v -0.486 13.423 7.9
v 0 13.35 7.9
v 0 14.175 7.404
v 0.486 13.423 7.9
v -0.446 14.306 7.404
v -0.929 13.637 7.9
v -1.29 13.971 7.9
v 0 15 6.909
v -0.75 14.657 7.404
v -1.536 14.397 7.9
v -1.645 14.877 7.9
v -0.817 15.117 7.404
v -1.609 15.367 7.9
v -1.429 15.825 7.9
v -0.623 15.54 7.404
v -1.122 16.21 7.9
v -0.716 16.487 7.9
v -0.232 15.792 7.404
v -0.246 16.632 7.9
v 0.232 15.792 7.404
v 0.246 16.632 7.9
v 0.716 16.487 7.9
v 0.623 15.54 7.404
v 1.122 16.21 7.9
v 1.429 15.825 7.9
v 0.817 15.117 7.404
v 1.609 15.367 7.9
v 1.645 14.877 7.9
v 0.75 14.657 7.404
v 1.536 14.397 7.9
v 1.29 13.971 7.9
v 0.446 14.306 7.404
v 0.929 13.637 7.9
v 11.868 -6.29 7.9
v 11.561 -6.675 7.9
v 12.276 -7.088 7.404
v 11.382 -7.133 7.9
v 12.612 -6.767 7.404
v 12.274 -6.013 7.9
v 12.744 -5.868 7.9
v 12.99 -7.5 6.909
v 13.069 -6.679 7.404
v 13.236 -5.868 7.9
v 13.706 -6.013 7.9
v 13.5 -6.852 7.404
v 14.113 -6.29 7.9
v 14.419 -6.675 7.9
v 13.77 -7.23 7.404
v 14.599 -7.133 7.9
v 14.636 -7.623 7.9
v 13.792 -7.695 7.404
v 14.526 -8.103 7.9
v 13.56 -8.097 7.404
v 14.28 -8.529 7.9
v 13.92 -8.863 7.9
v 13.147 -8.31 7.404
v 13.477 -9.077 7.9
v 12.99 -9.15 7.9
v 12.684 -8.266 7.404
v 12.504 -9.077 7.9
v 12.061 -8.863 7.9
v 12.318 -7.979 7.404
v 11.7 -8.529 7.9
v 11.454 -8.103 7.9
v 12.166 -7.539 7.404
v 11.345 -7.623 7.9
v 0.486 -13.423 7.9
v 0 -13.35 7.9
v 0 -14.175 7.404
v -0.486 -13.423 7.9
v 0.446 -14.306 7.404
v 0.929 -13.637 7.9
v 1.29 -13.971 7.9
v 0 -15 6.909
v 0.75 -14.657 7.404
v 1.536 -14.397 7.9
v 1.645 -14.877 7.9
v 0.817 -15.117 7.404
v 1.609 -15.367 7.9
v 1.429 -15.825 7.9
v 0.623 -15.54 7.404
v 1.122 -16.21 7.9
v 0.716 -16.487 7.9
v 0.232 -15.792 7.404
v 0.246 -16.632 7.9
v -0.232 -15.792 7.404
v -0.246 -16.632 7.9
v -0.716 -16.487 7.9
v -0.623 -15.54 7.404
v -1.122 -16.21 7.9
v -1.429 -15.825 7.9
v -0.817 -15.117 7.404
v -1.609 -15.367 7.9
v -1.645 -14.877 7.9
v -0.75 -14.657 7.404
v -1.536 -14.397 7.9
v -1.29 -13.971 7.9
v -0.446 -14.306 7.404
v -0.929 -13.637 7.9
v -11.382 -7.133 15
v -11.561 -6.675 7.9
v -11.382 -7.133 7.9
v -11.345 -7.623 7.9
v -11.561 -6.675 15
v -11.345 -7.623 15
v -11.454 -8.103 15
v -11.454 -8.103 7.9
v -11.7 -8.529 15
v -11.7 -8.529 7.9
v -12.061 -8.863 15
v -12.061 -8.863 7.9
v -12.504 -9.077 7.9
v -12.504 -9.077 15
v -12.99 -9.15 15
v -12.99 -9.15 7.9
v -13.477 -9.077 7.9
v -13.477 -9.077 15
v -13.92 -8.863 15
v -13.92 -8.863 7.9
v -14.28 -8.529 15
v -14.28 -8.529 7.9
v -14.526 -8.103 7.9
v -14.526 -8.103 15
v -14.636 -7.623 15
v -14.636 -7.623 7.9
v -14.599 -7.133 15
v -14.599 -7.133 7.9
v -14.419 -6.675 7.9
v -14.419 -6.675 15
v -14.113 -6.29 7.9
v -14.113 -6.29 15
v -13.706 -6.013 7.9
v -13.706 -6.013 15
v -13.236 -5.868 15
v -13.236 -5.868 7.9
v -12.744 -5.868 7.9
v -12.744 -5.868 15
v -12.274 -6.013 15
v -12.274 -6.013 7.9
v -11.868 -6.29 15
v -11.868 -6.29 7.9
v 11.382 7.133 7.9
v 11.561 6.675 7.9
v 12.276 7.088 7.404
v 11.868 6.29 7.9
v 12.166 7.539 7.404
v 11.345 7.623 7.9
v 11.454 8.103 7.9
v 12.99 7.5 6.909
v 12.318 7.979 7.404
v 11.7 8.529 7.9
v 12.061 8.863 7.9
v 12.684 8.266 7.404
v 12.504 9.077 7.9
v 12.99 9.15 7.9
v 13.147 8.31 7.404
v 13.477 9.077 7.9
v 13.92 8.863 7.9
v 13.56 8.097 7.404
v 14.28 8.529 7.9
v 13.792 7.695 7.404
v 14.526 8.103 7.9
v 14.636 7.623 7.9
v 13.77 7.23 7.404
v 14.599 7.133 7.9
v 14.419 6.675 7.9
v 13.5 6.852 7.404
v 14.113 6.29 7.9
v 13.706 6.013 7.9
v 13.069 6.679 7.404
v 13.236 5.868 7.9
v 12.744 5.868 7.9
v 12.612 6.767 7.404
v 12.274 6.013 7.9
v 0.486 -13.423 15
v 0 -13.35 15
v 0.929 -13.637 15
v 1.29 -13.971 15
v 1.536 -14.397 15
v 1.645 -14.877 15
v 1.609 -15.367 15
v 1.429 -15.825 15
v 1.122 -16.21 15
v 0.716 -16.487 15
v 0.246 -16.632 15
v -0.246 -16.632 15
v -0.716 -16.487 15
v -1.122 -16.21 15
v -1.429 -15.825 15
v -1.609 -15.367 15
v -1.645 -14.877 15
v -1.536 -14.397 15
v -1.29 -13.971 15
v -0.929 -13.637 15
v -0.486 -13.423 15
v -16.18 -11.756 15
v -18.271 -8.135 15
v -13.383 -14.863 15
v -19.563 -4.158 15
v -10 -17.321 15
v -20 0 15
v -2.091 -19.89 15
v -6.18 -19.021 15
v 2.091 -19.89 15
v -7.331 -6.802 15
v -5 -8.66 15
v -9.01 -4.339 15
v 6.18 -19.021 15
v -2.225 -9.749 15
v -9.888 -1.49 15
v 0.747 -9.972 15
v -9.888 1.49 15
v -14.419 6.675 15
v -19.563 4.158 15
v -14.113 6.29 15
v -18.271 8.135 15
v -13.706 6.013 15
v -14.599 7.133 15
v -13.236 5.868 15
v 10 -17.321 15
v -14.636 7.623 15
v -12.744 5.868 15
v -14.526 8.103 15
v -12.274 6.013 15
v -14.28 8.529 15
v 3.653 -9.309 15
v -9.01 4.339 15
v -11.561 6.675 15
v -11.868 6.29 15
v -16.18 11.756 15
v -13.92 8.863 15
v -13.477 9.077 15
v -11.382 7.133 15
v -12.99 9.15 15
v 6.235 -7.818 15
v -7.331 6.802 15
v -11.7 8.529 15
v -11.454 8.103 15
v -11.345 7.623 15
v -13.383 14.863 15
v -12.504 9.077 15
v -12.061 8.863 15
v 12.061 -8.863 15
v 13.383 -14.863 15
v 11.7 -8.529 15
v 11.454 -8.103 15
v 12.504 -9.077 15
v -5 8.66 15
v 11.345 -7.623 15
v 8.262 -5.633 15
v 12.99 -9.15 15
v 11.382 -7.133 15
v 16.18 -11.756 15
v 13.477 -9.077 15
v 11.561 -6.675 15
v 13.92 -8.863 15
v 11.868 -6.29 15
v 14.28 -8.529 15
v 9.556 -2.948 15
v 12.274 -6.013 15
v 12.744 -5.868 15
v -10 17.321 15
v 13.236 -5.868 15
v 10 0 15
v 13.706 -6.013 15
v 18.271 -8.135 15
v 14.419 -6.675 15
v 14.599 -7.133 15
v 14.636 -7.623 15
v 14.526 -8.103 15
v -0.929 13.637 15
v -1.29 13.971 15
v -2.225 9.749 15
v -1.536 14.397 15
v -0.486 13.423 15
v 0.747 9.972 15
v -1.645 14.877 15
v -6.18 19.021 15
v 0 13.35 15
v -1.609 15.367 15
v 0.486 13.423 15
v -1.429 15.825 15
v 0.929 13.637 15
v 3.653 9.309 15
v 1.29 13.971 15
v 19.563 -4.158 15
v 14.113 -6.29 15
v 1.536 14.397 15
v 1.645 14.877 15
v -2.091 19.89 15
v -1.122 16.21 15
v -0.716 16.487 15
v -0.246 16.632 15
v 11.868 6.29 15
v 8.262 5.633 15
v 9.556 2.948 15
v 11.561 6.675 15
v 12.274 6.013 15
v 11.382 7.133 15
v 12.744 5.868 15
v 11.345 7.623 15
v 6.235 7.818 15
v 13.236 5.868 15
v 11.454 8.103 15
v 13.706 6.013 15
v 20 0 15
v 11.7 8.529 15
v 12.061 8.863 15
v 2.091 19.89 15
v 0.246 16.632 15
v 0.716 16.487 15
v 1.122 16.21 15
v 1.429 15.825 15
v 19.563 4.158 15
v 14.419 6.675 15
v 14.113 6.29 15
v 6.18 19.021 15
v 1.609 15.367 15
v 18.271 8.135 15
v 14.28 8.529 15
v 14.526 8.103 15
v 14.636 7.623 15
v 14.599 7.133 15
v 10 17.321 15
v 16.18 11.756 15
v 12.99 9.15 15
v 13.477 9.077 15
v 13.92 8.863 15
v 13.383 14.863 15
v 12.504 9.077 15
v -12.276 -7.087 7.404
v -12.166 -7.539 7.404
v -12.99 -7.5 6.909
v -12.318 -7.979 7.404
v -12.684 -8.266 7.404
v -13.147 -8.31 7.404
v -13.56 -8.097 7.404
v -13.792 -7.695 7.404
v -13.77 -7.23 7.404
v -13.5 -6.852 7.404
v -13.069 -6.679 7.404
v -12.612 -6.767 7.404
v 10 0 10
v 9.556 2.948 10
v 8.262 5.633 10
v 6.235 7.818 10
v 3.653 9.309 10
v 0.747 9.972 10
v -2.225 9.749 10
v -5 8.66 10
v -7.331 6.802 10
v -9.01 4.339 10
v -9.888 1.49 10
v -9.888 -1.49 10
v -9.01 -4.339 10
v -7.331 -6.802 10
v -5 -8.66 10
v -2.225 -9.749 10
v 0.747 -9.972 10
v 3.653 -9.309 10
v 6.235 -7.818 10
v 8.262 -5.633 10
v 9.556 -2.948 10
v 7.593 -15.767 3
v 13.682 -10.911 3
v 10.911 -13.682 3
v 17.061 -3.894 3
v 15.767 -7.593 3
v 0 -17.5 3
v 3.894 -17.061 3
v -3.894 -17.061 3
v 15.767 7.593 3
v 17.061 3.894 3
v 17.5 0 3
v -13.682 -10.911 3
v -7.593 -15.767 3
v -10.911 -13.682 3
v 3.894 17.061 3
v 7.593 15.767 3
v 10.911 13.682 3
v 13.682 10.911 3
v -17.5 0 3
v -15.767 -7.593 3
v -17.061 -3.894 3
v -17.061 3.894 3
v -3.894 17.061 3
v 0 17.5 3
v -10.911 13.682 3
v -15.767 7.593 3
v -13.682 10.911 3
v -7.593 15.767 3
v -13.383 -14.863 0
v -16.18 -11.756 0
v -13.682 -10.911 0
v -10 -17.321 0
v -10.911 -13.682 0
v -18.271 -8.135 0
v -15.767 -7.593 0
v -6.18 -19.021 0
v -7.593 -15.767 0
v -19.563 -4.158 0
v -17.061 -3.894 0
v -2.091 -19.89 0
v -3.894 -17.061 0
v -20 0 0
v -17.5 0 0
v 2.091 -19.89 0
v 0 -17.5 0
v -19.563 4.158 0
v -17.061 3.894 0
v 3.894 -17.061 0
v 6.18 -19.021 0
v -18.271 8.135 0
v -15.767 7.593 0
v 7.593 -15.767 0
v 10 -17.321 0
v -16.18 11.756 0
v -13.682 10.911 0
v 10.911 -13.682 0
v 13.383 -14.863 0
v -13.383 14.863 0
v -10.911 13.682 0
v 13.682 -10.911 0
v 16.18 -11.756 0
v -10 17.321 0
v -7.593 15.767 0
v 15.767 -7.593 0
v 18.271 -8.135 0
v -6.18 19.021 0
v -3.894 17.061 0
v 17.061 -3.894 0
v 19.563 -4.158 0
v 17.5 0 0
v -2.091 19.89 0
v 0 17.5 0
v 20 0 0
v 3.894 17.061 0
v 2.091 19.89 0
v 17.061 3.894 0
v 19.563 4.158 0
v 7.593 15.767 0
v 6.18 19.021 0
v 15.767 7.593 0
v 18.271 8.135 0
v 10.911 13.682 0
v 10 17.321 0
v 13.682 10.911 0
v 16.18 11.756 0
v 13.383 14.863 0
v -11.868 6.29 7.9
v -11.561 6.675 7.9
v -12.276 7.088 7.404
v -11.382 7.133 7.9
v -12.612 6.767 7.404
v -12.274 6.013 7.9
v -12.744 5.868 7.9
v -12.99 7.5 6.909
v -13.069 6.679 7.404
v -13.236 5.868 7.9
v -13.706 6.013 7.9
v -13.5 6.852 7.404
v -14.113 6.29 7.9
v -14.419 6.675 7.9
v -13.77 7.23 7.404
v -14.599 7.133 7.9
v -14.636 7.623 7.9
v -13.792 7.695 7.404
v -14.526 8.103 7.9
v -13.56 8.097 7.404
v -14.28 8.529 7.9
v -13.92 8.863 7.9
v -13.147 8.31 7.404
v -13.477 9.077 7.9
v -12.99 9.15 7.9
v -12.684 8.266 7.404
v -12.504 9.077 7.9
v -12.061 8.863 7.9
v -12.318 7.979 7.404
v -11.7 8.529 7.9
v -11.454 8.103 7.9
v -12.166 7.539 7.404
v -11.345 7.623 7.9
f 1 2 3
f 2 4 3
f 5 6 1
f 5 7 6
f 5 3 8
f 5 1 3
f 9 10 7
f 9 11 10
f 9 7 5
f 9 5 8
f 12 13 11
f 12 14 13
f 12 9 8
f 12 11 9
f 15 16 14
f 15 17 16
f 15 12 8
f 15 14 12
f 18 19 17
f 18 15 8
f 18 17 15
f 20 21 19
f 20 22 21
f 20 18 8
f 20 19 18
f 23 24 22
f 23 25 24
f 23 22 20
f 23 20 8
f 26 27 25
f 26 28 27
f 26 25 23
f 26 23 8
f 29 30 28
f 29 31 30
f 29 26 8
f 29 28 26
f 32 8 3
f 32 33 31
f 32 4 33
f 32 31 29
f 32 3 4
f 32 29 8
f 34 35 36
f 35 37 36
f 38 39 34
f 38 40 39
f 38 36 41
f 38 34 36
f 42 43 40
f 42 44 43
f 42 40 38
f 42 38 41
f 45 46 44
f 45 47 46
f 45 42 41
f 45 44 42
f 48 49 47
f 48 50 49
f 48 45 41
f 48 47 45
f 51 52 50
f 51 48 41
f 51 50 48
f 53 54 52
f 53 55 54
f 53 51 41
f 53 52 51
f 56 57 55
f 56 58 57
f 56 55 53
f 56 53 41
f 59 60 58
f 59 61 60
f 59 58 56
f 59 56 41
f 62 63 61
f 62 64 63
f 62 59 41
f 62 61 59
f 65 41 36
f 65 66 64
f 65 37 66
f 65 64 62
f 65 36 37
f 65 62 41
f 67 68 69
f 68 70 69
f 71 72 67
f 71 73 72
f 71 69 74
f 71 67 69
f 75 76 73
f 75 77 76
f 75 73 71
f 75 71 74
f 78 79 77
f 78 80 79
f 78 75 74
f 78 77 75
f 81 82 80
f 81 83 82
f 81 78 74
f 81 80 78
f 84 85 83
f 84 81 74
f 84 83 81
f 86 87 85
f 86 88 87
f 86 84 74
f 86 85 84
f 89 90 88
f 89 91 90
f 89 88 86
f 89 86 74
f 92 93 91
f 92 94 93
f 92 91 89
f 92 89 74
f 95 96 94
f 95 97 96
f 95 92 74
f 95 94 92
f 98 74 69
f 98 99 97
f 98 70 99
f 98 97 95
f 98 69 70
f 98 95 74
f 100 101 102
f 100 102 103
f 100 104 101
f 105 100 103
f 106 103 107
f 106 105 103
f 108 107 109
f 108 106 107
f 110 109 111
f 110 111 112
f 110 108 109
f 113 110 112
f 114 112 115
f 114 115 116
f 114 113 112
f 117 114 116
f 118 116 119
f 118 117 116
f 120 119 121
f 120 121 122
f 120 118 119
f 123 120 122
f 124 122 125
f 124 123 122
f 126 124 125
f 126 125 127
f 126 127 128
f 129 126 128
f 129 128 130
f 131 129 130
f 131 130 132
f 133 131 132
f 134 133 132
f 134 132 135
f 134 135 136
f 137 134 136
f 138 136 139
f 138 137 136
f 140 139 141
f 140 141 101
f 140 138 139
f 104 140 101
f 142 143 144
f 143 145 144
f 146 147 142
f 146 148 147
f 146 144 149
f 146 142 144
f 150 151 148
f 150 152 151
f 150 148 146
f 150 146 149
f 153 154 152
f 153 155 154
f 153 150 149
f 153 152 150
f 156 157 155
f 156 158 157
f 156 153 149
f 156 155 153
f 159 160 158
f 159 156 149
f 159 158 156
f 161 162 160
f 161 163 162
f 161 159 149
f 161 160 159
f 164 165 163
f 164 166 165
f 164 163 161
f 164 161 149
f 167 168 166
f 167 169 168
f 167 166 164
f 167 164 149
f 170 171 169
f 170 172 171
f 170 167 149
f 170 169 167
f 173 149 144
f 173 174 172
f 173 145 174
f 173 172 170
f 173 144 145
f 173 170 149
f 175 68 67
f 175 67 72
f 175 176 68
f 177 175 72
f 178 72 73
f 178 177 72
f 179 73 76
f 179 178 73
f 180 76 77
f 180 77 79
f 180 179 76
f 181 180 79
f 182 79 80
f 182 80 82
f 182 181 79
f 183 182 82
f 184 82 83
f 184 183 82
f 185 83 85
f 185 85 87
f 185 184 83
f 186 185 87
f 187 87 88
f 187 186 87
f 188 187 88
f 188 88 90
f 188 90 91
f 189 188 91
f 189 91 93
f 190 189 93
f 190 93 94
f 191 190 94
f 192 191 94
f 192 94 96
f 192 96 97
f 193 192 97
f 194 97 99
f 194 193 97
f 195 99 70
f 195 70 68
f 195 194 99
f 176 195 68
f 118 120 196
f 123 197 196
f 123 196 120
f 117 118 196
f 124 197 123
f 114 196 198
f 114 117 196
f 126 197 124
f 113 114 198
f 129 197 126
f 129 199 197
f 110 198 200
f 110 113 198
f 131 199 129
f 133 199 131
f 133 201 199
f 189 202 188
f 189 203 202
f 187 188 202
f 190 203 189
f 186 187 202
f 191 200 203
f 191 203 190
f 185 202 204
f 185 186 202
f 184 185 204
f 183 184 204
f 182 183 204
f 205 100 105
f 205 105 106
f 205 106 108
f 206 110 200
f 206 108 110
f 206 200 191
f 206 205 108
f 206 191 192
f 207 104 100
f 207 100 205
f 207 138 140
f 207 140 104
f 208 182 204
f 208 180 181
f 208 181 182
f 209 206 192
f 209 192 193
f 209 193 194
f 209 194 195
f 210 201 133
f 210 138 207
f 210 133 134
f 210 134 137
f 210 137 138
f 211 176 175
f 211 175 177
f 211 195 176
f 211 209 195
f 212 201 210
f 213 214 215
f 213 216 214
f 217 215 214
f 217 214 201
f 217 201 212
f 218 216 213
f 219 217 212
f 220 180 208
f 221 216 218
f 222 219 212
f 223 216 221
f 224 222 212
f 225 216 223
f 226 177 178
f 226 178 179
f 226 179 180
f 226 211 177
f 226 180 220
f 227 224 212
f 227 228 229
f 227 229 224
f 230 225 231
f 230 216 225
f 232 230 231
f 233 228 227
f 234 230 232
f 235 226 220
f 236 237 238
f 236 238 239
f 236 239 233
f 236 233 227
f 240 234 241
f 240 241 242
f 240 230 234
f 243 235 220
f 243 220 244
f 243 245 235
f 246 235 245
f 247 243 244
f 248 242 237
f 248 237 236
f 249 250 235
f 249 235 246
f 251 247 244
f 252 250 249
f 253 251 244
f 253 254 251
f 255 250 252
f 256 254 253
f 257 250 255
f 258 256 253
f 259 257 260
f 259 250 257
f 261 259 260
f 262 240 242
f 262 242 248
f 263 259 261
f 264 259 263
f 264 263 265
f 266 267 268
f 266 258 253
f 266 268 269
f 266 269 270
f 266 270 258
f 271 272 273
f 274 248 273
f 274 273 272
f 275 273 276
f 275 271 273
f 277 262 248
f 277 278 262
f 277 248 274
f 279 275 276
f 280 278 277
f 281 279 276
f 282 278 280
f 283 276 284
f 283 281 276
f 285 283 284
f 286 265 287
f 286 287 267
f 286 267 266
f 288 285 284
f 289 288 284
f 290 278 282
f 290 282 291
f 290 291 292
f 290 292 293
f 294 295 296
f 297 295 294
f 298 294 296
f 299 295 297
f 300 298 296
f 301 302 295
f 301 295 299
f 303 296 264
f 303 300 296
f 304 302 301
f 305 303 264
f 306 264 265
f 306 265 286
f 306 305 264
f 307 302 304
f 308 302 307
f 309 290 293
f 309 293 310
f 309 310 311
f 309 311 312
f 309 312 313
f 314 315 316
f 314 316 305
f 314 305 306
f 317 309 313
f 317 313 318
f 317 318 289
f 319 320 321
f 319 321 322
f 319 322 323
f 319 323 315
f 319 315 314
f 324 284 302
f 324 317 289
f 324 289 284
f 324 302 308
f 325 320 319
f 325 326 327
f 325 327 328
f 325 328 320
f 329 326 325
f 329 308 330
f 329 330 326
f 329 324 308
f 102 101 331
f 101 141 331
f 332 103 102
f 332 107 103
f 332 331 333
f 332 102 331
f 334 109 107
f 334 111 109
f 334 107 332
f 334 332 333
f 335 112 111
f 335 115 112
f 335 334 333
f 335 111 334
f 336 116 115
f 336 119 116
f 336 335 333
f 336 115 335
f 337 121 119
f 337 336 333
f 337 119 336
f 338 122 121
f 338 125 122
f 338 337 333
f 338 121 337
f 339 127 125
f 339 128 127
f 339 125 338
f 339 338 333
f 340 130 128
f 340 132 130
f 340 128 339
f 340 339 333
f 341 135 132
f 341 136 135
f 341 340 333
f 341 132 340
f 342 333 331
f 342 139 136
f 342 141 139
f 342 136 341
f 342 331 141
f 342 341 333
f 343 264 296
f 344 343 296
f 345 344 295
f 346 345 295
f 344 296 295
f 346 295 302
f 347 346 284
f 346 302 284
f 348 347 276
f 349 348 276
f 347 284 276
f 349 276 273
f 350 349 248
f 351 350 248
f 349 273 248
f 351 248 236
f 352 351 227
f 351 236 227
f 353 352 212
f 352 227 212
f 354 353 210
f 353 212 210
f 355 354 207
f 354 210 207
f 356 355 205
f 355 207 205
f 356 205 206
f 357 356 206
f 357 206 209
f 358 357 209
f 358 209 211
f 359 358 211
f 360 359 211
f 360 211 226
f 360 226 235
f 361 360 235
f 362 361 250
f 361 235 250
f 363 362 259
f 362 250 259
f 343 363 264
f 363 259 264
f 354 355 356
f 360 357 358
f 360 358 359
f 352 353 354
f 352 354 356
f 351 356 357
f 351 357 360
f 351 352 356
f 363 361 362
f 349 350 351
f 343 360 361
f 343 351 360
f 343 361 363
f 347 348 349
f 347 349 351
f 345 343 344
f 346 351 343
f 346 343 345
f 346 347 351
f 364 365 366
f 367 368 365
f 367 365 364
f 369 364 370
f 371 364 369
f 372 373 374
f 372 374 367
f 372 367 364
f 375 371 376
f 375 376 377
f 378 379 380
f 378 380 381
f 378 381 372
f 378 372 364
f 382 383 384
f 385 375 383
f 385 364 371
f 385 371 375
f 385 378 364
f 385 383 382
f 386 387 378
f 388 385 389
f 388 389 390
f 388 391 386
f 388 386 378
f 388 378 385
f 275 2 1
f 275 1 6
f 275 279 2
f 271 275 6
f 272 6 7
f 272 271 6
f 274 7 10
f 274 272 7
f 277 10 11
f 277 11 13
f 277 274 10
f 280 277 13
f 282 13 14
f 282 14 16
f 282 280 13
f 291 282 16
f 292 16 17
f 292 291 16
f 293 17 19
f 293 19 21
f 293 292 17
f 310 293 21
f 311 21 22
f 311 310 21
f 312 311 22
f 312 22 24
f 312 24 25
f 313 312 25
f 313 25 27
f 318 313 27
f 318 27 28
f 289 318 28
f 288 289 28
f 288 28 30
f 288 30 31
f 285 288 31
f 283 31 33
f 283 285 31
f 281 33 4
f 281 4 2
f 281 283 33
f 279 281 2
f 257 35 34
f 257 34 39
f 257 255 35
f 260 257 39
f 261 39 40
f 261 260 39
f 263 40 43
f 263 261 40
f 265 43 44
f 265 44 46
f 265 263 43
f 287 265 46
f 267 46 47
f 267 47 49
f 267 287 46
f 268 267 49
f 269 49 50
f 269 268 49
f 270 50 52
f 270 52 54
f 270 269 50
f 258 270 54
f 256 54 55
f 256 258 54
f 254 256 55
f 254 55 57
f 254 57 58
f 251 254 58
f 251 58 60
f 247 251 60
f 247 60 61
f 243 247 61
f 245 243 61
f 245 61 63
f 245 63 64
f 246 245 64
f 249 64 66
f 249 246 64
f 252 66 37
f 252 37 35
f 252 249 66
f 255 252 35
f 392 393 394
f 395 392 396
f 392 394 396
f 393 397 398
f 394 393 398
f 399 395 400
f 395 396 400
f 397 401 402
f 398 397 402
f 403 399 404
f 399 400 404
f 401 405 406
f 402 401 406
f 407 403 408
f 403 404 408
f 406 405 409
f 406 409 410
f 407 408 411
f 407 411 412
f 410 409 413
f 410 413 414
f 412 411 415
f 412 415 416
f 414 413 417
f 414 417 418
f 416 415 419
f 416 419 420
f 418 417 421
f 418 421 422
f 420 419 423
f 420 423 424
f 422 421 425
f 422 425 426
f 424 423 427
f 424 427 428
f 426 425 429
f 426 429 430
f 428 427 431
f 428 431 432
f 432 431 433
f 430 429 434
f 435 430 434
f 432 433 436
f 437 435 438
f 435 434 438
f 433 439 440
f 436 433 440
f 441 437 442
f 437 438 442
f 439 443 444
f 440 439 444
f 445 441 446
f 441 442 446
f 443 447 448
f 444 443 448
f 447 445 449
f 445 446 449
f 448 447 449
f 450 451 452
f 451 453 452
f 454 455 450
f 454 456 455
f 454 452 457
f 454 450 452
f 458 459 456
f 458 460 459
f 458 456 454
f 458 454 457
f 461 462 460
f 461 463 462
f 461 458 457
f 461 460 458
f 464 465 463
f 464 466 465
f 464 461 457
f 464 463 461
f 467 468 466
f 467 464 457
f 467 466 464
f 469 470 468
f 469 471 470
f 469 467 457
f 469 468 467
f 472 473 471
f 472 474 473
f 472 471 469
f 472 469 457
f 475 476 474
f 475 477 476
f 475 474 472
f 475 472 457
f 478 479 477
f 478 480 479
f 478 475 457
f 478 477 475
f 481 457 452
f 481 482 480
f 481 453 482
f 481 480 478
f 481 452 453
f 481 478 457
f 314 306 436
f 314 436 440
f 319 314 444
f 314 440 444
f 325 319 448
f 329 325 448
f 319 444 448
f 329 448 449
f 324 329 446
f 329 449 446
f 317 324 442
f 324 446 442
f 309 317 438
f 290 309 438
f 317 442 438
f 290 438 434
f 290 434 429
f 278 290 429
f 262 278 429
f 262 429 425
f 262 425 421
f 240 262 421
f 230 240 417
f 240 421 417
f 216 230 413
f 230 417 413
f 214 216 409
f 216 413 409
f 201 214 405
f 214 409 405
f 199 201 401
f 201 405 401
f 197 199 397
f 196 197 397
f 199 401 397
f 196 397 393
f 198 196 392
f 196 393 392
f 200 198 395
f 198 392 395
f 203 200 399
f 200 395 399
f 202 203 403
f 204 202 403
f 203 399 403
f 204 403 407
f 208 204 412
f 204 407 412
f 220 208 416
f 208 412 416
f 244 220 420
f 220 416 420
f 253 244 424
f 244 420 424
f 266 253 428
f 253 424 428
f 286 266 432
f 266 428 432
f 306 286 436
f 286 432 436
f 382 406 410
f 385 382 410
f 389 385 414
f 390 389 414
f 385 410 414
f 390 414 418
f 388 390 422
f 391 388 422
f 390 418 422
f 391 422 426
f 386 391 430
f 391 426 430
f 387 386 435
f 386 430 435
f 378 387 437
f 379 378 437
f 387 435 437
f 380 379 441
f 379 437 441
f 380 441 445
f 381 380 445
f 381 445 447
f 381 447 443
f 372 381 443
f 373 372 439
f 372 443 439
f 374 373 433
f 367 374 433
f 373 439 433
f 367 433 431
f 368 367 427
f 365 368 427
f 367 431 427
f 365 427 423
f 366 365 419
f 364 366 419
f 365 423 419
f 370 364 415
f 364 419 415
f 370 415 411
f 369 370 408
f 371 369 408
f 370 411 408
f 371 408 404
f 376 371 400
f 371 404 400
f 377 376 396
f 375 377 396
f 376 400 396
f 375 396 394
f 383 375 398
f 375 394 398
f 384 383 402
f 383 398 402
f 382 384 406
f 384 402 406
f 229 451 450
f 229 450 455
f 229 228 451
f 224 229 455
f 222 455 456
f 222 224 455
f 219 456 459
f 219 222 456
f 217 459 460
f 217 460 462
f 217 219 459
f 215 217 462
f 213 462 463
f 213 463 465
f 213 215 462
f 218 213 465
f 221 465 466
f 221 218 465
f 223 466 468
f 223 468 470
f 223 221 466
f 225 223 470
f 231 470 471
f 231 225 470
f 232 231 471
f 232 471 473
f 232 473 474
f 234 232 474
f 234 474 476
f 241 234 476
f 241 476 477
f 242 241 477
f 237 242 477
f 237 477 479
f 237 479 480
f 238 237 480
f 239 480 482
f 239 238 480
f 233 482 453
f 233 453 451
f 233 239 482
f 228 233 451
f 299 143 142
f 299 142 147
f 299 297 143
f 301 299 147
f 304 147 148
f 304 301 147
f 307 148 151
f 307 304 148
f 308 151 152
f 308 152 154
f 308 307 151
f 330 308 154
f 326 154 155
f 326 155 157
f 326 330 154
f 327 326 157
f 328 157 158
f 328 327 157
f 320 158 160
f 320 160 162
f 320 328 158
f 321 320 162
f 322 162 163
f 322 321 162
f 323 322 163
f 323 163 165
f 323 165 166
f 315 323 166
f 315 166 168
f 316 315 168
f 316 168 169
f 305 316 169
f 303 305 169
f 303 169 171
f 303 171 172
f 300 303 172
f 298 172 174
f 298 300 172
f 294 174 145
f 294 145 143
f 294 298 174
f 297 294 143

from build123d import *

# Parameters (mm, degrees)
SKETCH1_R           = 20
BOSS_EXTRUDE1_DEPTH = 15
SKETCH2_R           = 10
CUT_EXTRUDE1_DEPTH  = 5
CIRPATTERN2_COUNT   = 6
SKETCH5_R           = 17.5
CUT_EXTRUDE2_DEPTH  = 3


with BuildPart() as part:
    # Sketch1 → Boss-Extrude1 (new body)
    with BuildSketch(Plane.XY):
        Circle(SKETCH1_R)
    extrude(amount=BOSS_EXTRUDE1_DEPTH)

    # Sketch2 → Cut-Extrude1 (cut)
    with BuildSketch(Plane.XY.offset(15)):
        Circle(SKETCH2_R)
    extrude(amount=-CUT_EXTRUDE1_DEPTH, mode=Mode.SUBTRACT)

    # Sketch4 → M4x0.7 Tapped Hole1 (revolve, cut)
    with BuildSketch(Plane(origin=(0, 15, 15), x_dir=(0, -1, 0), z_dir=(1, 0, 0))):
        Polygon((0, 0), (0, 8.091420021), (1.65, 7.1), (1.65, 0), align=None)
    m4x0_7_tapped_hole1 = revolve(axis=Axis((0, 15, 21.35), (0, 0, -1)), mode=Mode.SUBTRACT)

    # CirPattern2: M4x0.7 Tapped Hole1 ×6 about axis
    cirpattern2_axis = Axis((0, 0, 0), (0, 0, 1))
    for i in range(1, CIRPATTERN2_COUNT):
        add(m4x0_7_tapped_hole1.rotate(cirpattern2_axis, i * 360 / CIRPATTERN2_COUNT), mode=Mode.SUBTRACT)

    # Sketch5 → Cut-Extrude2 (cut)
    with BuildSketch(Plane(origin=(0, 0, 0), x_dir=(-1, 0, 0), z_dir=(0, 0, -1))):
        Circle(SKETCH5_R)
    extrude(amount=-CUT_EXTRUDE2_DEPTH, mode=Mode.SUBTRACT)


solid = part.part
